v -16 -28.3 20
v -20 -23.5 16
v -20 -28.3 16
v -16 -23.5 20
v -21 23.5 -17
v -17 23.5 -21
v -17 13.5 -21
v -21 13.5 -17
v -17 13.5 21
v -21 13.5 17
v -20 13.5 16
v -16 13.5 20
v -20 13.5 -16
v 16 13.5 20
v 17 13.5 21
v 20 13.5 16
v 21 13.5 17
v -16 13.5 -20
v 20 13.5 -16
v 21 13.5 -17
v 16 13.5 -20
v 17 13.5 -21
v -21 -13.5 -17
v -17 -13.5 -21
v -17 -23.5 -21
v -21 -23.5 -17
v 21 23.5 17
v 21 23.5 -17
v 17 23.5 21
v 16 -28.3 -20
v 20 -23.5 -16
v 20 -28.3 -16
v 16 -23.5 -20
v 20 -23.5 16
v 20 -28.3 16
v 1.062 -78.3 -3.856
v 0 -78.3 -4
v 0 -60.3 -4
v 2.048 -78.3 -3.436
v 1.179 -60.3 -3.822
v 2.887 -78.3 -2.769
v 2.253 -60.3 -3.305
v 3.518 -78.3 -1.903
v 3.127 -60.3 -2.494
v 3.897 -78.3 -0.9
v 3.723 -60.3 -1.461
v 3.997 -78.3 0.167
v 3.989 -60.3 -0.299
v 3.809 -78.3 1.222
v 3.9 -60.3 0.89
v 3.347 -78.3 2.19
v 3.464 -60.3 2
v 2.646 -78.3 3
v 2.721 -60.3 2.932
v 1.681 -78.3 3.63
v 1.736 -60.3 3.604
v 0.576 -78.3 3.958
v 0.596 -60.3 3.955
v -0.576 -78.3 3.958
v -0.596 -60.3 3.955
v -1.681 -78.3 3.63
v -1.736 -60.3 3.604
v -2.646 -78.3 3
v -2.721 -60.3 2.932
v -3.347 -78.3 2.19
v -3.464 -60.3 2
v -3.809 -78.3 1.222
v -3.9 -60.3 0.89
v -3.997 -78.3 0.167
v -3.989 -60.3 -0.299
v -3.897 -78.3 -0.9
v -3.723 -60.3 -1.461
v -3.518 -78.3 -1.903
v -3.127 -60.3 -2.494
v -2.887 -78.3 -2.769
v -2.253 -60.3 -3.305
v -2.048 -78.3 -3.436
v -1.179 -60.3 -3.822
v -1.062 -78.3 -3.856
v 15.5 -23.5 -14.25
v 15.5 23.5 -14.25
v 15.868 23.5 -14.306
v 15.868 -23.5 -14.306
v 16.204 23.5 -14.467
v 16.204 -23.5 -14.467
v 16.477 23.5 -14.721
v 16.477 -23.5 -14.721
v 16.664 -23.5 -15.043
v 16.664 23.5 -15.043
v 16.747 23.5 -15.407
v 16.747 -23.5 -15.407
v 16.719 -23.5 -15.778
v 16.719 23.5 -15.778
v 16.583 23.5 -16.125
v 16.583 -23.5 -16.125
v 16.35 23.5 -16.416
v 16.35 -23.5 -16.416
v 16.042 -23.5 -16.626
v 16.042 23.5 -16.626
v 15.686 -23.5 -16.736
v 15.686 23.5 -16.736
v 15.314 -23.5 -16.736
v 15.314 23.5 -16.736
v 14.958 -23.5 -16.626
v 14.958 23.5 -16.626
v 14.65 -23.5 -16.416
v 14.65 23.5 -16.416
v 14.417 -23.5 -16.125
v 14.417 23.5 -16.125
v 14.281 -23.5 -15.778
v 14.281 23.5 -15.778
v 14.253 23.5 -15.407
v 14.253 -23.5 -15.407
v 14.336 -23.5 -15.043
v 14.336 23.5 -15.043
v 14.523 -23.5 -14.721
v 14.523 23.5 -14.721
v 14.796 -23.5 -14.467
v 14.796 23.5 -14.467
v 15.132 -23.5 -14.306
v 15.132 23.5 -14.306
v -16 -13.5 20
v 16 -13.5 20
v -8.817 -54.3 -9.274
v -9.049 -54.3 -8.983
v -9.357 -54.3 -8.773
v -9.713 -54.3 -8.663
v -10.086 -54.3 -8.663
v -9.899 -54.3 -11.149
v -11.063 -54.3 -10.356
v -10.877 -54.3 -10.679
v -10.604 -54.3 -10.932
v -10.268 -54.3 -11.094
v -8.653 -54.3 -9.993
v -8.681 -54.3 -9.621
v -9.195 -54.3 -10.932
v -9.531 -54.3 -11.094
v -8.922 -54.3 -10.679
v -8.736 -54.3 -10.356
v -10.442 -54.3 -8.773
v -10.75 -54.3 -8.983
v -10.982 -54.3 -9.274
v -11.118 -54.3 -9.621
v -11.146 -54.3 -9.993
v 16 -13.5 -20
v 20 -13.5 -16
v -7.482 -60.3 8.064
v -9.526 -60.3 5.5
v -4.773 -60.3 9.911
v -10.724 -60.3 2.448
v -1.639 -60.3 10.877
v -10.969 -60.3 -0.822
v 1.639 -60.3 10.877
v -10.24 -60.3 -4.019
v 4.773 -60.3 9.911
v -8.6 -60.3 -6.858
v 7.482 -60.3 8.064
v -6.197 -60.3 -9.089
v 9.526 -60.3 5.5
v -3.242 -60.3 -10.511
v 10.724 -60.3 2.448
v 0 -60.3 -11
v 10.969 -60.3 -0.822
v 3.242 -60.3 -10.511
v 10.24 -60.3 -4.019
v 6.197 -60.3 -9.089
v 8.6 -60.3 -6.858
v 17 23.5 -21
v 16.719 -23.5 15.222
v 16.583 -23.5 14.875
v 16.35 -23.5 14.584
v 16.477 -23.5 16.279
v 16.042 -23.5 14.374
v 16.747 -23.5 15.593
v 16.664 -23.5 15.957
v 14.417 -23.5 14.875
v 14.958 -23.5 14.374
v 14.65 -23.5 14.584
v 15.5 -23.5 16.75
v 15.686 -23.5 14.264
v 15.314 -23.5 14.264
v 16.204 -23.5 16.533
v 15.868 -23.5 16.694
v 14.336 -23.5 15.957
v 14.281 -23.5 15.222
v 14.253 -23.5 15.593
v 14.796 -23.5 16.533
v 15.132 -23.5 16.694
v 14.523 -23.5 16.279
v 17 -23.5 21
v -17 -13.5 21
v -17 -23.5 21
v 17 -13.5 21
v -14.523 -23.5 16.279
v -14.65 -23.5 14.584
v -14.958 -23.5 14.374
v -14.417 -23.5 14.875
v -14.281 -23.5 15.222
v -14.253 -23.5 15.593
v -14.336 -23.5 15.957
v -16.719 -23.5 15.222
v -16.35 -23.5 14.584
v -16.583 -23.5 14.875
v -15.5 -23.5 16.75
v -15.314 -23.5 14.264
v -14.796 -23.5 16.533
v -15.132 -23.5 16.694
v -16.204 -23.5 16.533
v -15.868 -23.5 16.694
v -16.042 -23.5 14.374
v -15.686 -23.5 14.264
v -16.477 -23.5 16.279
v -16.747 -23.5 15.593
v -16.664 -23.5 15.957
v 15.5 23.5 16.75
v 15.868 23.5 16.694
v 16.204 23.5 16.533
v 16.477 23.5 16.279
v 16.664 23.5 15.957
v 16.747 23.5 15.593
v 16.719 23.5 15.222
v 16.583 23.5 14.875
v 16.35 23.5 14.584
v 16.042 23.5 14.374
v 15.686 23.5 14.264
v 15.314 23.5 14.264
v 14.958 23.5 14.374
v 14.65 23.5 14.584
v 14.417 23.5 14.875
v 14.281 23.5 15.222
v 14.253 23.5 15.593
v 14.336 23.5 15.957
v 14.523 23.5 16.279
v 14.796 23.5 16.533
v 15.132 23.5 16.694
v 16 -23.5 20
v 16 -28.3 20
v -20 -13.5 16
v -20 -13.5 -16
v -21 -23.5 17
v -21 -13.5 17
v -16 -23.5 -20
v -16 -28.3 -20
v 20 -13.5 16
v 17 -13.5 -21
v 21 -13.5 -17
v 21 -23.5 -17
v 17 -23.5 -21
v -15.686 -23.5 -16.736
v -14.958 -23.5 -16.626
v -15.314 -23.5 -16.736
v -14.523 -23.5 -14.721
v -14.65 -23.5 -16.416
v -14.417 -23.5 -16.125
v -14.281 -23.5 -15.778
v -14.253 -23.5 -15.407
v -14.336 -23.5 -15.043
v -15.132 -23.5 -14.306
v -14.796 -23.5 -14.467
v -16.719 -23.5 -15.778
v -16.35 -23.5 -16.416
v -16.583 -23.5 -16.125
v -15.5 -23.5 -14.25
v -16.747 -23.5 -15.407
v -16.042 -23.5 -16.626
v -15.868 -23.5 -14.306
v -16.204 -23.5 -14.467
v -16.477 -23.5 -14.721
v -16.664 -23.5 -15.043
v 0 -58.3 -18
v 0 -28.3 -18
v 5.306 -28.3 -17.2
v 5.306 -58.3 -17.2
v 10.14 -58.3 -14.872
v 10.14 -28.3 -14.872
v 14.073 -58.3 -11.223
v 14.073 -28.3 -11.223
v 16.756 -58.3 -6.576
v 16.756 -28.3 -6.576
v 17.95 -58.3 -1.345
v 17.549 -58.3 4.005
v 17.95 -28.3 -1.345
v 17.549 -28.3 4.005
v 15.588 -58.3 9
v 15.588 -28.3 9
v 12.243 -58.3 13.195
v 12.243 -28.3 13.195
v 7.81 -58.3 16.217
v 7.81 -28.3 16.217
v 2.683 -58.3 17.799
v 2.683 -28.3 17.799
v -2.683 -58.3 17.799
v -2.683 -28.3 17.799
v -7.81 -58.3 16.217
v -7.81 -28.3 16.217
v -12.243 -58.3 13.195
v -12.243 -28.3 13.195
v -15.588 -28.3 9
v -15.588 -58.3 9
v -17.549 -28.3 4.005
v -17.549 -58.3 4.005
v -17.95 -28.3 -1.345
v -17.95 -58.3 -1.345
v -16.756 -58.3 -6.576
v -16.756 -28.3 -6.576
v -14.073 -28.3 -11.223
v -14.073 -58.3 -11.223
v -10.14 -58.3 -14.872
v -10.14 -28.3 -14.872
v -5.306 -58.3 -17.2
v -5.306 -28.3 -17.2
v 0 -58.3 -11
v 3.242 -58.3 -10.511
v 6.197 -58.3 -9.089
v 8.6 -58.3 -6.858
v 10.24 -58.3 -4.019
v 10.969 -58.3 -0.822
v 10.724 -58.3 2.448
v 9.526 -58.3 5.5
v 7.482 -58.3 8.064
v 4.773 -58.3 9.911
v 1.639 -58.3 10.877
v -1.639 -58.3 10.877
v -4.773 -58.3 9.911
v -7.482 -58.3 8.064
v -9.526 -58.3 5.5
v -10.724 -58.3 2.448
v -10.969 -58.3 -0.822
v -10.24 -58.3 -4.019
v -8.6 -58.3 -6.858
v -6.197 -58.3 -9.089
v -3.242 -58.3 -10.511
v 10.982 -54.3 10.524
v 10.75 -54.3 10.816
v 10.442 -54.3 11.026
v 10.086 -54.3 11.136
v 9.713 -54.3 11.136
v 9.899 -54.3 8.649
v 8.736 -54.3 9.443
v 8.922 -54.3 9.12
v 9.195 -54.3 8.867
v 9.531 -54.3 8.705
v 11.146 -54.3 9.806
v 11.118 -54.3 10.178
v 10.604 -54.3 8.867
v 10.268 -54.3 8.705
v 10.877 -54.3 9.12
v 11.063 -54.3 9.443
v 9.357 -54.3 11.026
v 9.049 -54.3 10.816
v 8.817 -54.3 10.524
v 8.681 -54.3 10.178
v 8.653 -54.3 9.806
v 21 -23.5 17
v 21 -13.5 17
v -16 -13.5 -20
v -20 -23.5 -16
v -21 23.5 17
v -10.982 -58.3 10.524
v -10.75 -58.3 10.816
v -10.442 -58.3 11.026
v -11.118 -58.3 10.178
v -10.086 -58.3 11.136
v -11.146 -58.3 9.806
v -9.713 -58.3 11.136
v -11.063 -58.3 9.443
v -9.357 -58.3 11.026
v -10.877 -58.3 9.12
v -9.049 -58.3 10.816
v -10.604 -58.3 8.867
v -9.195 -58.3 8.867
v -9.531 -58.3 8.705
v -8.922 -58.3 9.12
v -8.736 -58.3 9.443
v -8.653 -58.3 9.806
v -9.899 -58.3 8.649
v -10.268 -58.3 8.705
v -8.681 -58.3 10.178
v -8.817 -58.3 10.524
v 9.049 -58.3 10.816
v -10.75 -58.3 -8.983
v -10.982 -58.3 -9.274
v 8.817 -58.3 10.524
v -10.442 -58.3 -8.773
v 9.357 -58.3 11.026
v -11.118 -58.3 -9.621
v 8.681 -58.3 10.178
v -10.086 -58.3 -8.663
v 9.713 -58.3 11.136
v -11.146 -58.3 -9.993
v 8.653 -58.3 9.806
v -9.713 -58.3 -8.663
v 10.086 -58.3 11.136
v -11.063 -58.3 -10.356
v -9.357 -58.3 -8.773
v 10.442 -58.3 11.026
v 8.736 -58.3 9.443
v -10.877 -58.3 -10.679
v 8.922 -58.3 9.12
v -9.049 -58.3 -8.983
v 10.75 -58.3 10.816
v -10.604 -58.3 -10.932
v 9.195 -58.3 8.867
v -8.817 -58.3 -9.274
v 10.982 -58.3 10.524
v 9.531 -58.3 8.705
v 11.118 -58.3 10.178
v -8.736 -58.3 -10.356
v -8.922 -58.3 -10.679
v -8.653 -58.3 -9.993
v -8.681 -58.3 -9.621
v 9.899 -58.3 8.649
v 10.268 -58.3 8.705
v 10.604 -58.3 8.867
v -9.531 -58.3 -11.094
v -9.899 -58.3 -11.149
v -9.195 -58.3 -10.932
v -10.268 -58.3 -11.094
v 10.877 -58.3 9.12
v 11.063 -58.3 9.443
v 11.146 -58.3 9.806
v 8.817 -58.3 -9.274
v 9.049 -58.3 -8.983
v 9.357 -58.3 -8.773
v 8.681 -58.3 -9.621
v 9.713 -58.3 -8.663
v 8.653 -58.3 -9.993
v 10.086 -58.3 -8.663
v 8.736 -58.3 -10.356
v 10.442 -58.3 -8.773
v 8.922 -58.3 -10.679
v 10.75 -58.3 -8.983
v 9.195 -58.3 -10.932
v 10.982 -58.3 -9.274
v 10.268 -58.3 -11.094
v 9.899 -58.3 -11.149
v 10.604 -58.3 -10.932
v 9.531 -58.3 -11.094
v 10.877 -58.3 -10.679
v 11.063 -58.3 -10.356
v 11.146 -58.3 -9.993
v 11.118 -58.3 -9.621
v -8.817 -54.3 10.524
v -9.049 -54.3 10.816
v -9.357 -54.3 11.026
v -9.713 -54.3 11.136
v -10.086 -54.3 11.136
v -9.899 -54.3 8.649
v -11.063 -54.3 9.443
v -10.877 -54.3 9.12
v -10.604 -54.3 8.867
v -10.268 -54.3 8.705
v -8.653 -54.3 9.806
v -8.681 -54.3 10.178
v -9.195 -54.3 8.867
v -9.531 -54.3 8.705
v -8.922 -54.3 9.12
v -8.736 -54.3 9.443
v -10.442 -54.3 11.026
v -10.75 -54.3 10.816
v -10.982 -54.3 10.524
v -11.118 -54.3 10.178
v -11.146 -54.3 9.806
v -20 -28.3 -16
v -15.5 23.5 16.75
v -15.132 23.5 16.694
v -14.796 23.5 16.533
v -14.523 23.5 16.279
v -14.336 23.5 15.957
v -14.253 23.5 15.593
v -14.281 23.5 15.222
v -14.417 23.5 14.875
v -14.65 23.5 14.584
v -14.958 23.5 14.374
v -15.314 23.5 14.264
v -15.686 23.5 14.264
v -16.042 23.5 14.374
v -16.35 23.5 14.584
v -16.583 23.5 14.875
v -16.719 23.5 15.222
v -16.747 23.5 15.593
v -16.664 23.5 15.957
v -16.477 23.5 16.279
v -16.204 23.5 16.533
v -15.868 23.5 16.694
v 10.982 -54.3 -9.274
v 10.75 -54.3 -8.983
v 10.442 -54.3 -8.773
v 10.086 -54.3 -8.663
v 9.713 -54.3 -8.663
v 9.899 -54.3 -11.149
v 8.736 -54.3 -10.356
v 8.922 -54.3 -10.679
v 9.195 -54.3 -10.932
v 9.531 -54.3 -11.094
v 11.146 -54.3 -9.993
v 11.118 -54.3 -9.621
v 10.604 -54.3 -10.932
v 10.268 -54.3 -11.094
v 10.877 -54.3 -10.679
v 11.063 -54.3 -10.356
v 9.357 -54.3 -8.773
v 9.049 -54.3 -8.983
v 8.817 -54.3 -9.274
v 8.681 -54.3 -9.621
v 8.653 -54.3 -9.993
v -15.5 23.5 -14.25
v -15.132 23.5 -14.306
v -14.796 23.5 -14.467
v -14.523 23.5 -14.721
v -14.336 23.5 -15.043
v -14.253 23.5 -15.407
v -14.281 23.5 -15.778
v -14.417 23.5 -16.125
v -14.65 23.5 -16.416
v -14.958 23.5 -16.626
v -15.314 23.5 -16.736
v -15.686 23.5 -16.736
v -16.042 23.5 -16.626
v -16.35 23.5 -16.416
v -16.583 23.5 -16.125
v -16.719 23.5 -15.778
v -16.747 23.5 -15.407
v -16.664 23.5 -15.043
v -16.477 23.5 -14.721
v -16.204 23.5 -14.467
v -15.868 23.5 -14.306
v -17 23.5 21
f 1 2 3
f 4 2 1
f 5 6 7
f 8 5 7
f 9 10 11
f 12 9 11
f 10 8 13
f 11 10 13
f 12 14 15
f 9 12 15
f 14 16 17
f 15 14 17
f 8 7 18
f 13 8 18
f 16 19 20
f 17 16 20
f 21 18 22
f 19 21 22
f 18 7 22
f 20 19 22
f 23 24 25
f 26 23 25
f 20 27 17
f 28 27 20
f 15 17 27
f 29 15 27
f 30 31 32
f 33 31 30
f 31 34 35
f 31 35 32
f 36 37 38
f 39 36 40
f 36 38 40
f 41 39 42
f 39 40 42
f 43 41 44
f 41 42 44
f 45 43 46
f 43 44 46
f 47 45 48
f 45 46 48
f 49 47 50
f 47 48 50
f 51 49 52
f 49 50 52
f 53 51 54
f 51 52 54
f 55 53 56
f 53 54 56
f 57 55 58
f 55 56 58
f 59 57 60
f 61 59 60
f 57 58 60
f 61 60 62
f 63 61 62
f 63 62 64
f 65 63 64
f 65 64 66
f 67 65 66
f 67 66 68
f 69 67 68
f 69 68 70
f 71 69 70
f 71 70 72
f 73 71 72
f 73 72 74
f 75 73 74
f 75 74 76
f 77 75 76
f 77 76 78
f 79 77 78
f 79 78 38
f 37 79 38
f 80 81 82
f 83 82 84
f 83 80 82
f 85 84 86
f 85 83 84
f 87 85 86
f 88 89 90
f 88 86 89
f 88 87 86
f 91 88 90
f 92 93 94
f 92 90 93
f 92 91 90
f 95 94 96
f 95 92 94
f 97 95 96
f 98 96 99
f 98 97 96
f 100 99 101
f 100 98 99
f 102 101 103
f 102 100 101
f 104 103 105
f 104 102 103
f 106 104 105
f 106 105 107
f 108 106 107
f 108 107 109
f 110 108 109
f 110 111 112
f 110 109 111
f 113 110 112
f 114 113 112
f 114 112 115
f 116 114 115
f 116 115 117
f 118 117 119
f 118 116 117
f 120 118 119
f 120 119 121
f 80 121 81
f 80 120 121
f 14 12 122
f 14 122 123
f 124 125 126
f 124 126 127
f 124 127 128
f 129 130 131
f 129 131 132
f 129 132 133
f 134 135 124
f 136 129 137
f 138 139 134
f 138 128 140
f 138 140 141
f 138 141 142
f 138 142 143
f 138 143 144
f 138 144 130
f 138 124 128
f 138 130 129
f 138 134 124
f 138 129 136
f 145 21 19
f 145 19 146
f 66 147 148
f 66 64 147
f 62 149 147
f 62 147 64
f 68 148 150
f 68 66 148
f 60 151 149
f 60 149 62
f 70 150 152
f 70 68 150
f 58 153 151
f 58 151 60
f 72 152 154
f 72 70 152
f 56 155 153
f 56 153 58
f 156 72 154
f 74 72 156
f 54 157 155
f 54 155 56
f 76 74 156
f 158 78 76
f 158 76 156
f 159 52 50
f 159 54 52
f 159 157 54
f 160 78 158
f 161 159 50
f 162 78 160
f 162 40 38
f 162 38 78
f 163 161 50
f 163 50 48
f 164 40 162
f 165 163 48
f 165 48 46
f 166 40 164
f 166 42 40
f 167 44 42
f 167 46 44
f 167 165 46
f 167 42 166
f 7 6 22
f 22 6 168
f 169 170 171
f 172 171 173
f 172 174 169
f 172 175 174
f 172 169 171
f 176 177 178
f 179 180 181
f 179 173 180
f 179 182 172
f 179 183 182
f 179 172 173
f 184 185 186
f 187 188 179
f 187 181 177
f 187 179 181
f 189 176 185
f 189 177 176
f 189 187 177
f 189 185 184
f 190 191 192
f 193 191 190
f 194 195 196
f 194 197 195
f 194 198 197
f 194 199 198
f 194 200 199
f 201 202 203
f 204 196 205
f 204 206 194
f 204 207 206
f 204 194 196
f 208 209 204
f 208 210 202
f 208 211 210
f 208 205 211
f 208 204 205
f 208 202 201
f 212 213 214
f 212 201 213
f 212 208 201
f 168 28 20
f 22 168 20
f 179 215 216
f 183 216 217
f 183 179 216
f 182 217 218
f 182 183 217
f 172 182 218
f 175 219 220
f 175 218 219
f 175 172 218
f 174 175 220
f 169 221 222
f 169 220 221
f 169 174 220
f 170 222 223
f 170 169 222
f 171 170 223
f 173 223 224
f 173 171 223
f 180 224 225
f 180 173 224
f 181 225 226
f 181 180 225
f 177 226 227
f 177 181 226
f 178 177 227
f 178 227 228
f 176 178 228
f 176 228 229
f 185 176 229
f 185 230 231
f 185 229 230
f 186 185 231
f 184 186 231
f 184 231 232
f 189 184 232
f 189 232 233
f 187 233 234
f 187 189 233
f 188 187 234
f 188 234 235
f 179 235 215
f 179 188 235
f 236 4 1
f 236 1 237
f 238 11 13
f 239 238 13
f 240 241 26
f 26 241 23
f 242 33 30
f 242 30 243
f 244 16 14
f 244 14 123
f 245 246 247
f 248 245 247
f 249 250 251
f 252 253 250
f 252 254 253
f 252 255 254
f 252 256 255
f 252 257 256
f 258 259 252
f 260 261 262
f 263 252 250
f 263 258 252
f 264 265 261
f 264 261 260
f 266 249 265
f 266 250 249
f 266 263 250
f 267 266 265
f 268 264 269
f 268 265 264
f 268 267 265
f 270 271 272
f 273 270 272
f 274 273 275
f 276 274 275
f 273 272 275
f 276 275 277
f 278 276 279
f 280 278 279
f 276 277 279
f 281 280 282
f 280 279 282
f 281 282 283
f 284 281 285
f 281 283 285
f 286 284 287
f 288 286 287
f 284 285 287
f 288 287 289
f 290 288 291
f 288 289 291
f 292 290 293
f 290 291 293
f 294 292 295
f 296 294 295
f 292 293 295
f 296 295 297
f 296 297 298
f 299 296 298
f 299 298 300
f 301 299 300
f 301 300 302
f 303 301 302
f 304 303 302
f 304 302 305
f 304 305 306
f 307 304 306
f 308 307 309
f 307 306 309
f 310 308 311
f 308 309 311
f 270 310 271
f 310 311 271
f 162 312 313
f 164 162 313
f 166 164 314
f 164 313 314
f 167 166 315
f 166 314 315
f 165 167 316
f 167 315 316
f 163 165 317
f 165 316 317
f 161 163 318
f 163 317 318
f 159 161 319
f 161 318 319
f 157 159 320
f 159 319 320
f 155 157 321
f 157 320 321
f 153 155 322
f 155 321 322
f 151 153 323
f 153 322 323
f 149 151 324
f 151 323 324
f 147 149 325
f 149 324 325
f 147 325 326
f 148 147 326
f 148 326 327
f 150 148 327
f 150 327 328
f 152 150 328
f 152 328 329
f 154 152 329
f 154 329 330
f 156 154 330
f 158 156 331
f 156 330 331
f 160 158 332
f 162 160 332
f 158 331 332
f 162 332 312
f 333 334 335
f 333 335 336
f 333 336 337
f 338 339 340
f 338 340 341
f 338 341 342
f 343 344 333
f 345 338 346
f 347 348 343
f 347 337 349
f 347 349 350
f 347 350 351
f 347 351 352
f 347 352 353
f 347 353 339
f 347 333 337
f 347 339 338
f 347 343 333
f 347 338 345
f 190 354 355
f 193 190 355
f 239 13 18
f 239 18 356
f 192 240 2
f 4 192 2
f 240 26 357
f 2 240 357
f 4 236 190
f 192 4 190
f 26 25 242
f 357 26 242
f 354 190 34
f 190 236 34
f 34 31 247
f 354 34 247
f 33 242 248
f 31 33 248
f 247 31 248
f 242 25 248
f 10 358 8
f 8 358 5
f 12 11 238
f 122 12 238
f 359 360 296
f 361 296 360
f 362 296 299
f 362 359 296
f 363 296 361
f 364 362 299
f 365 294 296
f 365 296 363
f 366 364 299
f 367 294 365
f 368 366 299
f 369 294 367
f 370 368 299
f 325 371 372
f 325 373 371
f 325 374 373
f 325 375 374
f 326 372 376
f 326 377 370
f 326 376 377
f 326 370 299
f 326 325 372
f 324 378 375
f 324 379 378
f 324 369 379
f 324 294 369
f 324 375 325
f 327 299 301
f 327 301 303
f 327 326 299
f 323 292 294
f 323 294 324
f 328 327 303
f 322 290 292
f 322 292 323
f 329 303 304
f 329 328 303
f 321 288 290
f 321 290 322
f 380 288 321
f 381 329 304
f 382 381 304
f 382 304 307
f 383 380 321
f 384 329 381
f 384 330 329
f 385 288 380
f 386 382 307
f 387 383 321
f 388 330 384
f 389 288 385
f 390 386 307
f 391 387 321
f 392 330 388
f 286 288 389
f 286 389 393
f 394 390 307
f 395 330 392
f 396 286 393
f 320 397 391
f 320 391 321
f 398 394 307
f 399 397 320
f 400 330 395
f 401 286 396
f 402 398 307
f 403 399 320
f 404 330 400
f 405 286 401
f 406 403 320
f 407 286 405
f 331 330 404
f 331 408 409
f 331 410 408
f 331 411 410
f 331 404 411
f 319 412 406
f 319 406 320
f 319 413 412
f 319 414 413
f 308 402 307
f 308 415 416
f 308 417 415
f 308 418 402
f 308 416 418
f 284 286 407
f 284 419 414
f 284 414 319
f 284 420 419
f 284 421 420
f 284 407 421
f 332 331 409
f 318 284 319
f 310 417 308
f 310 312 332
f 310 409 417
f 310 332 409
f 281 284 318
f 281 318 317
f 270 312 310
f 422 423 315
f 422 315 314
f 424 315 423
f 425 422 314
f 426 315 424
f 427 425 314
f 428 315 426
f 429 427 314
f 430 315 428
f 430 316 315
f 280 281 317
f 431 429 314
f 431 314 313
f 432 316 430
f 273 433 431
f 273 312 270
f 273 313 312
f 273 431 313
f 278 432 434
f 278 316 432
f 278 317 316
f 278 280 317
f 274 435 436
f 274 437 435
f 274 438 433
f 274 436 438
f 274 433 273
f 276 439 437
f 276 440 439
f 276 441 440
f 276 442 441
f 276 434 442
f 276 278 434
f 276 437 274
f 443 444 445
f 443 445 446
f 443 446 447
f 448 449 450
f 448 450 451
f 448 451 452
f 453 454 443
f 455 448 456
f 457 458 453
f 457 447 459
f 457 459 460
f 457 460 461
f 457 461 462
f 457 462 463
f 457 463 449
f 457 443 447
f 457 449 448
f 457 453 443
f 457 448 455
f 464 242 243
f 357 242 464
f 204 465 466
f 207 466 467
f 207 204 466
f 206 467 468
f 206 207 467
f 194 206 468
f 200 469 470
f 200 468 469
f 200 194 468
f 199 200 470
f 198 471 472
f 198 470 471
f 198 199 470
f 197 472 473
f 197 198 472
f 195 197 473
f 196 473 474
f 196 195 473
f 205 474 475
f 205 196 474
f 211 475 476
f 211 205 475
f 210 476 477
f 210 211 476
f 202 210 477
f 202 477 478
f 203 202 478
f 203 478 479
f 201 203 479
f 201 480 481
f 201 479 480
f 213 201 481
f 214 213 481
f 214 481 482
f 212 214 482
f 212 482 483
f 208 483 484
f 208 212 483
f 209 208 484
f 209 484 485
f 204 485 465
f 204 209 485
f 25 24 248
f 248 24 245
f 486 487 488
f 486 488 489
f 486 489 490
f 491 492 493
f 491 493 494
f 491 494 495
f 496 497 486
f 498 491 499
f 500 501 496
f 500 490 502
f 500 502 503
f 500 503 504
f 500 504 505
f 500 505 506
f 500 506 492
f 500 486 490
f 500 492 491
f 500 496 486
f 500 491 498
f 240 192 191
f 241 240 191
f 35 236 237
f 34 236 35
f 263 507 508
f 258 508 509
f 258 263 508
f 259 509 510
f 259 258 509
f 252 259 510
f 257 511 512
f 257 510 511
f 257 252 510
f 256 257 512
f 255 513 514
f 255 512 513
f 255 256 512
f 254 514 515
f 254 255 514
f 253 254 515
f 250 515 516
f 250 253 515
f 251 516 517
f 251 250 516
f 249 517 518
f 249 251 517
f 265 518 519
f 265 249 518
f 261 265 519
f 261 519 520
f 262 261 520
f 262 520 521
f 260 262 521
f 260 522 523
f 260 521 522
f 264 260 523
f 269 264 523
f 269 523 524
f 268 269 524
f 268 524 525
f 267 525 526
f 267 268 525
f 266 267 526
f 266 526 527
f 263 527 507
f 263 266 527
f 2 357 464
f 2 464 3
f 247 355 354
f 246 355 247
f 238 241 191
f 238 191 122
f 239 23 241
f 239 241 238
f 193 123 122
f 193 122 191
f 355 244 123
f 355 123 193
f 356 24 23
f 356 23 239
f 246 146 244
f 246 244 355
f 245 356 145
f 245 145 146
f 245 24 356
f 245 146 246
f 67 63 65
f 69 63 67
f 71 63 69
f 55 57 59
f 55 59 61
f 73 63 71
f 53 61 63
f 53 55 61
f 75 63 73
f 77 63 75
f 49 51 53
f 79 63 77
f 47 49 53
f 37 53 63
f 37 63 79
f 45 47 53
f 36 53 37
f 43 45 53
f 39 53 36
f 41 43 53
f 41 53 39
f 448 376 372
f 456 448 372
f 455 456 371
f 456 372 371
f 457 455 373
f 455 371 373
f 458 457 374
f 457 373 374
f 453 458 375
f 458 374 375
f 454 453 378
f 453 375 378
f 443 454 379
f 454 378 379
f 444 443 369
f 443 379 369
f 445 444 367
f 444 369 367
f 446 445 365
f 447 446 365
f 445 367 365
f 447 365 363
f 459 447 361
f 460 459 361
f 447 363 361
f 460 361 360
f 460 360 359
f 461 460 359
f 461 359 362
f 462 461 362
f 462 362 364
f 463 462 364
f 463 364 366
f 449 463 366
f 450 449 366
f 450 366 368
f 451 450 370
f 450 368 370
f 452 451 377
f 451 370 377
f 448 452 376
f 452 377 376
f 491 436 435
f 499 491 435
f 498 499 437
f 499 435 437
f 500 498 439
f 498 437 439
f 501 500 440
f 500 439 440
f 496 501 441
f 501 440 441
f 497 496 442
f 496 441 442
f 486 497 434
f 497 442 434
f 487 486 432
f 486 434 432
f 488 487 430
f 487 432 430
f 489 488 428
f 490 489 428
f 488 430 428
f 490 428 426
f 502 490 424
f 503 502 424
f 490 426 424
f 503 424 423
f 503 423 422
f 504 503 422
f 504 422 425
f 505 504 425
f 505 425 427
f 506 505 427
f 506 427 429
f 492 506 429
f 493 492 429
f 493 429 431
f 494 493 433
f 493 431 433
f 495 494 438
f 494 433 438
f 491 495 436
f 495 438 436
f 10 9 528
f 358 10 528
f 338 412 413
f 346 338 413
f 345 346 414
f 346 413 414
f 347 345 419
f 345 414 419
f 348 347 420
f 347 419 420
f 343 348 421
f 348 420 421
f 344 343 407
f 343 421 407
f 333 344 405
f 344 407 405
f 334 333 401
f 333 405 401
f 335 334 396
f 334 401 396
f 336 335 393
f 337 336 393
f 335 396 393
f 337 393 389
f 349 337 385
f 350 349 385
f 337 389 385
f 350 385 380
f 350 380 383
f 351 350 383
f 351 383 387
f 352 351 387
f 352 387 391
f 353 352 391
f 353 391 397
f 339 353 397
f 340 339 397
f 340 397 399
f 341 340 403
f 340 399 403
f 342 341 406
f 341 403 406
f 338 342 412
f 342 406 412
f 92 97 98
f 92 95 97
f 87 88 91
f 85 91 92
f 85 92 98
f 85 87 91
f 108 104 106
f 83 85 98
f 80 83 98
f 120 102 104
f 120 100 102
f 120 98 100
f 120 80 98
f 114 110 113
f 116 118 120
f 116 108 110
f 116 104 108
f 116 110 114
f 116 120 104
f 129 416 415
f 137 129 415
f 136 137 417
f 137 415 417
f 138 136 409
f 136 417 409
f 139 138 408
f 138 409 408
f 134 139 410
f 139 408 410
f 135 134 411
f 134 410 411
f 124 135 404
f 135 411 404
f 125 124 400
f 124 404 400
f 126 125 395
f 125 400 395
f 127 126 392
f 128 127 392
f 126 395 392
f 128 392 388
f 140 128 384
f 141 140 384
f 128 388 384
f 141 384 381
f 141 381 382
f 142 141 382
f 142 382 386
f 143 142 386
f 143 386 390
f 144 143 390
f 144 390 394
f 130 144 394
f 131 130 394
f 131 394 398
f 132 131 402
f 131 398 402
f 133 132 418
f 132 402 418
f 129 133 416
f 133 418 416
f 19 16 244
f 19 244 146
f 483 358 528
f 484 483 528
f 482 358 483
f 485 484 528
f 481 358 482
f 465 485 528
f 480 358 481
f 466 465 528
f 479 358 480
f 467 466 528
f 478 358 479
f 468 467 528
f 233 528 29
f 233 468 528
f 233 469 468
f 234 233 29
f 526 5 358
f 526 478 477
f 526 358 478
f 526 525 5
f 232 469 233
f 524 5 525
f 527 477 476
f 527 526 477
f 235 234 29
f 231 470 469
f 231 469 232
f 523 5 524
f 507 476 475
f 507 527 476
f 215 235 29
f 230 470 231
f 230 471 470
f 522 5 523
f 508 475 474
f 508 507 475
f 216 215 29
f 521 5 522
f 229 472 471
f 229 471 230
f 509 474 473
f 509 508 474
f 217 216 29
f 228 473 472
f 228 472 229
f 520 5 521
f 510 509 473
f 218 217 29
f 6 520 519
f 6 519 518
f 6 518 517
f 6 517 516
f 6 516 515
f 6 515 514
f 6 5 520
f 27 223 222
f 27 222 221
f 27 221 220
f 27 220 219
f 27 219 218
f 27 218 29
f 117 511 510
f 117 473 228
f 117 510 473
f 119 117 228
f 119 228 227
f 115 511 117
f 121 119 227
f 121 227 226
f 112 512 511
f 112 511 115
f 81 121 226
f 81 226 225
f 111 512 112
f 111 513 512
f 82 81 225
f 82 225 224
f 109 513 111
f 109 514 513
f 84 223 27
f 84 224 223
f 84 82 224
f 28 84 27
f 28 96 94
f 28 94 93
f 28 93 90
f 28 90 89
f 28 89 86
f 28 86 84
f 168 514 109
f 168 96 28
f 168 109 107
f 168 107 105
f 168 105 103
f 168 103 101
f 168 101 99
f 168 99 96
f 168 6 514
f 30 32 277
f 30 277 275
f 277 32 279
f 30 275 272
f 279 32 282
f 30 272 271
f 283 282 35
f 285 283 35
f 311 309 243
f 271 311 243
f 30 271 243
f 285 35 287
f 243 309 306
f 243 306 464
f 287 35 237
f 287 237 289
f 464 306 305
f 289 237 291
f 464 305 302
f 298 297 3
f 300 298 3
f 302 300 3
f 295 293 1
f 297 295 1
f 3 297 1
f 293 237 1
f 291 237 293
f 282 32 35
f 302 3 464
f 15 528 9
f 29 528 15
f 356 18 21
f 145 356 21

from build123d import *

# Parameters (mm, degrees)
SKETCH1_W               = 42
SKETCH1_H               = 42
BOSS_EXTRUDE1_DEPTH     = 23.5
CUT_EXTRUDE1_START      = -10
SKETCH2_W               = 42
SKETCH2_H               = 42
SKETCH2_W_2             = 40
SKETCH2_H_2             = 40
CUT_EXTRUDE1_DEPTH      = 27
CHAMFER1_SIZE           = 4
CUT_EXTRUDE2_DEPTH      = 56.596762496
CUT_EXTRUDE2_DEPTH_BACK = 56.596762496
SKETCH4_R               = 1.25
BOSS_EXTRUDE2_DEPTH     = 4.8
SKETCH6_R               = 18
BOSS_EXTRUDE3_DEPTH     = 30
SKETCH7_R               = 1.25
CUT_EXTRUDE3_DEPTH      = 4
SKETCH8_R               = 11
BOSS_EXTRUDE4_DEPTH     = 2
SKETCH9_R               = 4
BOSS_EXTRUDE5_DEPTH     = 18
BOSS_EXTRUDE6_START     = -15
BOSS_EXTRUDE6_DEPTH     = 15


with BuildPart() as part:
    # Sketch1 → Boss-Extrude1 (new, symmetric)
    with BuildSketch(Plane(origin=(0, 0, 0), x_dir=(1, 0, 0), z_dir=(0, 1, 0))):
        Rectangle(SKETCH1_W, SKETCH1_H)
    extrude(amount=BOSS_EXTRUDE1_DEPTH, both=True)

    # Sketch2 → Cut-Extrude1 (cut)
    with BuildSketch(Plane(origin=(0, 23.5, 0), x_dir=(1, 0, 0), z_dir=(0, 1, 0)).offset(CUT_EXTRUDE1_START)):
        Rectangle(SKETCH2_W, SKETCH2_H)
        Rectangle(SKETCH2_W_2, SKETCH2_H_2, mode=Mode.SUBTRACT)
    extrude(amount=-CUT_EXTRUDE1_DEPTH, mode=Mode.SUBTRACT)

    # Chamfer1
    chamfer1_edges = [part.edges().sort_by_distance(p)[0] for p in [
        (-21, -18.5, -21),
        (21, -18.5, -21),
        (21, -18.5, 21),
        (-21, -18.5, 21),
        (20, 0, -20),
        (20, 0, 20),
        (-20, 0, 20),
        (-20, 0, -20),
        (-21, 18.5, -21),
        (21, 18.5, -21),
        (21, 18.5, 21),
        (-21, 18.5, 21),
    ]]
    chamfer(chamfer1_edges, length=CHAMFER1_SIZE)

    # Sketch4 → Cut-Extrude2 (cut, two sides: drawn at the far end of the back side and taken through both)
    with BuildSketch(Plane(origin=(0, 23.5, 0), x_dir=(1, 0, 0), z_dir=(0, 1, 0)).offset(-CUT_EXTRUDE2_DEPTH_BACK)):
        with Locations(Location((15.5, 15.5, 0), (0, 0, 270))):
            Circle(SKETCH4_R)
        with Locations(Location((15.5, -15.5, 0), (0, 0, 270))):
            Circle(SKETCH4_R)
        with Locations(Location((-15.5, -15.5, 0), (0, 0, 270))):
            Circle(SKETCH4_R)
        with Locations(Location((-15.5, 15.5, 0), (0, 0, 270))):
            Circle(SKETCH4_R)
    extrude(amount=CUT_EXTRUDE2_DEPTH + CUT_EXTRUDE2_DEPTH_BACK, mode=Mode.SUBTRACT)

    # Sketch5 → Boss-Extrude2 (add)
    with BuildSketch(Plane.XZ.offset(23.5)):
        Polygon((-20, 16), (-16, 20), (16, 20), (20, 16), (20, -16), (16, -20), (-16, -20), (-20, -16), align=None)
    extrude(amount=BOSS_EXTRUDE2_DEPTH)

    # Sketch6 → Boss-Extrude3 (add)
    with BuildSketch(Plane.XZ.offset(28.3)):
        with Locations(Location((0, 0, 0), (0, 0, 270))):
            Circle(SKETCH6_R)
    extrude(amount=BOSS_EXTRUDE3_DEPTH)

    # Sketch7 → Cut-Extrude3 (cut)
    with BuildSketch(Plane.XZ.offset(58.3)):
        with Locations(Location((-9.899494937, 9.899494937, 0), (0, 0, 270))):
            Circle(SKETCH7_R)
        with Locations(Location((9.899494937, 9.899494937, 0), (0, 0, 270))):
            Circle(SKETCH7_R)
        with Locations(Location((9.899494937, -9.899494937, 0), (0, 0, 270))):
            Circle(SKETCH7_R)
        with Locations(Location((-9.899494937, -9.899494937, 0), (0, 0, 270))):
            Circle(SKETCH7_R)
    extrude(amount=-CUT_EXTRUDE3_DEPTH, mode=Mode.SUBTRACT)

    # Sketch8 → Boss-Extrude4 (add)
    with BuildSketch(Plane.XZ.offset(58.3)):
        with Locations(Location((0, 0, 0), (0, 0, 270))):
            Circle(SKETCH8_R)
    extrude(amount=BOSS_EXTRUDE4_DEPTH)

    # Sketch9 → Boss-Extrude5 (add)
    with BuildSketch(Plane.XZ.offset(60.3)):
        with Locations(Location((0, 0, 0), (0, 0, 270))):
            Circle(SKETCH9_R)
    extrude(amount=BOSS_EXTRUDE5_DEPTH)

    # Sketch10 → Boss-Extrude6 (add)
    with BuildSketch(Plane.XZ.offset(78.3).offset(BOSS_EXTRUDE6_START)):
        with BuildLine():
            Line((-2.645751311, 3), (2.645751311, 3))
            ThreePointArc((2.645751311, 3), (0, 4), (-2.645751311, 3))
        make_face()
    extrude(amount=BOSS_EXTRUDE6_DEPTH)


solid = part.part
